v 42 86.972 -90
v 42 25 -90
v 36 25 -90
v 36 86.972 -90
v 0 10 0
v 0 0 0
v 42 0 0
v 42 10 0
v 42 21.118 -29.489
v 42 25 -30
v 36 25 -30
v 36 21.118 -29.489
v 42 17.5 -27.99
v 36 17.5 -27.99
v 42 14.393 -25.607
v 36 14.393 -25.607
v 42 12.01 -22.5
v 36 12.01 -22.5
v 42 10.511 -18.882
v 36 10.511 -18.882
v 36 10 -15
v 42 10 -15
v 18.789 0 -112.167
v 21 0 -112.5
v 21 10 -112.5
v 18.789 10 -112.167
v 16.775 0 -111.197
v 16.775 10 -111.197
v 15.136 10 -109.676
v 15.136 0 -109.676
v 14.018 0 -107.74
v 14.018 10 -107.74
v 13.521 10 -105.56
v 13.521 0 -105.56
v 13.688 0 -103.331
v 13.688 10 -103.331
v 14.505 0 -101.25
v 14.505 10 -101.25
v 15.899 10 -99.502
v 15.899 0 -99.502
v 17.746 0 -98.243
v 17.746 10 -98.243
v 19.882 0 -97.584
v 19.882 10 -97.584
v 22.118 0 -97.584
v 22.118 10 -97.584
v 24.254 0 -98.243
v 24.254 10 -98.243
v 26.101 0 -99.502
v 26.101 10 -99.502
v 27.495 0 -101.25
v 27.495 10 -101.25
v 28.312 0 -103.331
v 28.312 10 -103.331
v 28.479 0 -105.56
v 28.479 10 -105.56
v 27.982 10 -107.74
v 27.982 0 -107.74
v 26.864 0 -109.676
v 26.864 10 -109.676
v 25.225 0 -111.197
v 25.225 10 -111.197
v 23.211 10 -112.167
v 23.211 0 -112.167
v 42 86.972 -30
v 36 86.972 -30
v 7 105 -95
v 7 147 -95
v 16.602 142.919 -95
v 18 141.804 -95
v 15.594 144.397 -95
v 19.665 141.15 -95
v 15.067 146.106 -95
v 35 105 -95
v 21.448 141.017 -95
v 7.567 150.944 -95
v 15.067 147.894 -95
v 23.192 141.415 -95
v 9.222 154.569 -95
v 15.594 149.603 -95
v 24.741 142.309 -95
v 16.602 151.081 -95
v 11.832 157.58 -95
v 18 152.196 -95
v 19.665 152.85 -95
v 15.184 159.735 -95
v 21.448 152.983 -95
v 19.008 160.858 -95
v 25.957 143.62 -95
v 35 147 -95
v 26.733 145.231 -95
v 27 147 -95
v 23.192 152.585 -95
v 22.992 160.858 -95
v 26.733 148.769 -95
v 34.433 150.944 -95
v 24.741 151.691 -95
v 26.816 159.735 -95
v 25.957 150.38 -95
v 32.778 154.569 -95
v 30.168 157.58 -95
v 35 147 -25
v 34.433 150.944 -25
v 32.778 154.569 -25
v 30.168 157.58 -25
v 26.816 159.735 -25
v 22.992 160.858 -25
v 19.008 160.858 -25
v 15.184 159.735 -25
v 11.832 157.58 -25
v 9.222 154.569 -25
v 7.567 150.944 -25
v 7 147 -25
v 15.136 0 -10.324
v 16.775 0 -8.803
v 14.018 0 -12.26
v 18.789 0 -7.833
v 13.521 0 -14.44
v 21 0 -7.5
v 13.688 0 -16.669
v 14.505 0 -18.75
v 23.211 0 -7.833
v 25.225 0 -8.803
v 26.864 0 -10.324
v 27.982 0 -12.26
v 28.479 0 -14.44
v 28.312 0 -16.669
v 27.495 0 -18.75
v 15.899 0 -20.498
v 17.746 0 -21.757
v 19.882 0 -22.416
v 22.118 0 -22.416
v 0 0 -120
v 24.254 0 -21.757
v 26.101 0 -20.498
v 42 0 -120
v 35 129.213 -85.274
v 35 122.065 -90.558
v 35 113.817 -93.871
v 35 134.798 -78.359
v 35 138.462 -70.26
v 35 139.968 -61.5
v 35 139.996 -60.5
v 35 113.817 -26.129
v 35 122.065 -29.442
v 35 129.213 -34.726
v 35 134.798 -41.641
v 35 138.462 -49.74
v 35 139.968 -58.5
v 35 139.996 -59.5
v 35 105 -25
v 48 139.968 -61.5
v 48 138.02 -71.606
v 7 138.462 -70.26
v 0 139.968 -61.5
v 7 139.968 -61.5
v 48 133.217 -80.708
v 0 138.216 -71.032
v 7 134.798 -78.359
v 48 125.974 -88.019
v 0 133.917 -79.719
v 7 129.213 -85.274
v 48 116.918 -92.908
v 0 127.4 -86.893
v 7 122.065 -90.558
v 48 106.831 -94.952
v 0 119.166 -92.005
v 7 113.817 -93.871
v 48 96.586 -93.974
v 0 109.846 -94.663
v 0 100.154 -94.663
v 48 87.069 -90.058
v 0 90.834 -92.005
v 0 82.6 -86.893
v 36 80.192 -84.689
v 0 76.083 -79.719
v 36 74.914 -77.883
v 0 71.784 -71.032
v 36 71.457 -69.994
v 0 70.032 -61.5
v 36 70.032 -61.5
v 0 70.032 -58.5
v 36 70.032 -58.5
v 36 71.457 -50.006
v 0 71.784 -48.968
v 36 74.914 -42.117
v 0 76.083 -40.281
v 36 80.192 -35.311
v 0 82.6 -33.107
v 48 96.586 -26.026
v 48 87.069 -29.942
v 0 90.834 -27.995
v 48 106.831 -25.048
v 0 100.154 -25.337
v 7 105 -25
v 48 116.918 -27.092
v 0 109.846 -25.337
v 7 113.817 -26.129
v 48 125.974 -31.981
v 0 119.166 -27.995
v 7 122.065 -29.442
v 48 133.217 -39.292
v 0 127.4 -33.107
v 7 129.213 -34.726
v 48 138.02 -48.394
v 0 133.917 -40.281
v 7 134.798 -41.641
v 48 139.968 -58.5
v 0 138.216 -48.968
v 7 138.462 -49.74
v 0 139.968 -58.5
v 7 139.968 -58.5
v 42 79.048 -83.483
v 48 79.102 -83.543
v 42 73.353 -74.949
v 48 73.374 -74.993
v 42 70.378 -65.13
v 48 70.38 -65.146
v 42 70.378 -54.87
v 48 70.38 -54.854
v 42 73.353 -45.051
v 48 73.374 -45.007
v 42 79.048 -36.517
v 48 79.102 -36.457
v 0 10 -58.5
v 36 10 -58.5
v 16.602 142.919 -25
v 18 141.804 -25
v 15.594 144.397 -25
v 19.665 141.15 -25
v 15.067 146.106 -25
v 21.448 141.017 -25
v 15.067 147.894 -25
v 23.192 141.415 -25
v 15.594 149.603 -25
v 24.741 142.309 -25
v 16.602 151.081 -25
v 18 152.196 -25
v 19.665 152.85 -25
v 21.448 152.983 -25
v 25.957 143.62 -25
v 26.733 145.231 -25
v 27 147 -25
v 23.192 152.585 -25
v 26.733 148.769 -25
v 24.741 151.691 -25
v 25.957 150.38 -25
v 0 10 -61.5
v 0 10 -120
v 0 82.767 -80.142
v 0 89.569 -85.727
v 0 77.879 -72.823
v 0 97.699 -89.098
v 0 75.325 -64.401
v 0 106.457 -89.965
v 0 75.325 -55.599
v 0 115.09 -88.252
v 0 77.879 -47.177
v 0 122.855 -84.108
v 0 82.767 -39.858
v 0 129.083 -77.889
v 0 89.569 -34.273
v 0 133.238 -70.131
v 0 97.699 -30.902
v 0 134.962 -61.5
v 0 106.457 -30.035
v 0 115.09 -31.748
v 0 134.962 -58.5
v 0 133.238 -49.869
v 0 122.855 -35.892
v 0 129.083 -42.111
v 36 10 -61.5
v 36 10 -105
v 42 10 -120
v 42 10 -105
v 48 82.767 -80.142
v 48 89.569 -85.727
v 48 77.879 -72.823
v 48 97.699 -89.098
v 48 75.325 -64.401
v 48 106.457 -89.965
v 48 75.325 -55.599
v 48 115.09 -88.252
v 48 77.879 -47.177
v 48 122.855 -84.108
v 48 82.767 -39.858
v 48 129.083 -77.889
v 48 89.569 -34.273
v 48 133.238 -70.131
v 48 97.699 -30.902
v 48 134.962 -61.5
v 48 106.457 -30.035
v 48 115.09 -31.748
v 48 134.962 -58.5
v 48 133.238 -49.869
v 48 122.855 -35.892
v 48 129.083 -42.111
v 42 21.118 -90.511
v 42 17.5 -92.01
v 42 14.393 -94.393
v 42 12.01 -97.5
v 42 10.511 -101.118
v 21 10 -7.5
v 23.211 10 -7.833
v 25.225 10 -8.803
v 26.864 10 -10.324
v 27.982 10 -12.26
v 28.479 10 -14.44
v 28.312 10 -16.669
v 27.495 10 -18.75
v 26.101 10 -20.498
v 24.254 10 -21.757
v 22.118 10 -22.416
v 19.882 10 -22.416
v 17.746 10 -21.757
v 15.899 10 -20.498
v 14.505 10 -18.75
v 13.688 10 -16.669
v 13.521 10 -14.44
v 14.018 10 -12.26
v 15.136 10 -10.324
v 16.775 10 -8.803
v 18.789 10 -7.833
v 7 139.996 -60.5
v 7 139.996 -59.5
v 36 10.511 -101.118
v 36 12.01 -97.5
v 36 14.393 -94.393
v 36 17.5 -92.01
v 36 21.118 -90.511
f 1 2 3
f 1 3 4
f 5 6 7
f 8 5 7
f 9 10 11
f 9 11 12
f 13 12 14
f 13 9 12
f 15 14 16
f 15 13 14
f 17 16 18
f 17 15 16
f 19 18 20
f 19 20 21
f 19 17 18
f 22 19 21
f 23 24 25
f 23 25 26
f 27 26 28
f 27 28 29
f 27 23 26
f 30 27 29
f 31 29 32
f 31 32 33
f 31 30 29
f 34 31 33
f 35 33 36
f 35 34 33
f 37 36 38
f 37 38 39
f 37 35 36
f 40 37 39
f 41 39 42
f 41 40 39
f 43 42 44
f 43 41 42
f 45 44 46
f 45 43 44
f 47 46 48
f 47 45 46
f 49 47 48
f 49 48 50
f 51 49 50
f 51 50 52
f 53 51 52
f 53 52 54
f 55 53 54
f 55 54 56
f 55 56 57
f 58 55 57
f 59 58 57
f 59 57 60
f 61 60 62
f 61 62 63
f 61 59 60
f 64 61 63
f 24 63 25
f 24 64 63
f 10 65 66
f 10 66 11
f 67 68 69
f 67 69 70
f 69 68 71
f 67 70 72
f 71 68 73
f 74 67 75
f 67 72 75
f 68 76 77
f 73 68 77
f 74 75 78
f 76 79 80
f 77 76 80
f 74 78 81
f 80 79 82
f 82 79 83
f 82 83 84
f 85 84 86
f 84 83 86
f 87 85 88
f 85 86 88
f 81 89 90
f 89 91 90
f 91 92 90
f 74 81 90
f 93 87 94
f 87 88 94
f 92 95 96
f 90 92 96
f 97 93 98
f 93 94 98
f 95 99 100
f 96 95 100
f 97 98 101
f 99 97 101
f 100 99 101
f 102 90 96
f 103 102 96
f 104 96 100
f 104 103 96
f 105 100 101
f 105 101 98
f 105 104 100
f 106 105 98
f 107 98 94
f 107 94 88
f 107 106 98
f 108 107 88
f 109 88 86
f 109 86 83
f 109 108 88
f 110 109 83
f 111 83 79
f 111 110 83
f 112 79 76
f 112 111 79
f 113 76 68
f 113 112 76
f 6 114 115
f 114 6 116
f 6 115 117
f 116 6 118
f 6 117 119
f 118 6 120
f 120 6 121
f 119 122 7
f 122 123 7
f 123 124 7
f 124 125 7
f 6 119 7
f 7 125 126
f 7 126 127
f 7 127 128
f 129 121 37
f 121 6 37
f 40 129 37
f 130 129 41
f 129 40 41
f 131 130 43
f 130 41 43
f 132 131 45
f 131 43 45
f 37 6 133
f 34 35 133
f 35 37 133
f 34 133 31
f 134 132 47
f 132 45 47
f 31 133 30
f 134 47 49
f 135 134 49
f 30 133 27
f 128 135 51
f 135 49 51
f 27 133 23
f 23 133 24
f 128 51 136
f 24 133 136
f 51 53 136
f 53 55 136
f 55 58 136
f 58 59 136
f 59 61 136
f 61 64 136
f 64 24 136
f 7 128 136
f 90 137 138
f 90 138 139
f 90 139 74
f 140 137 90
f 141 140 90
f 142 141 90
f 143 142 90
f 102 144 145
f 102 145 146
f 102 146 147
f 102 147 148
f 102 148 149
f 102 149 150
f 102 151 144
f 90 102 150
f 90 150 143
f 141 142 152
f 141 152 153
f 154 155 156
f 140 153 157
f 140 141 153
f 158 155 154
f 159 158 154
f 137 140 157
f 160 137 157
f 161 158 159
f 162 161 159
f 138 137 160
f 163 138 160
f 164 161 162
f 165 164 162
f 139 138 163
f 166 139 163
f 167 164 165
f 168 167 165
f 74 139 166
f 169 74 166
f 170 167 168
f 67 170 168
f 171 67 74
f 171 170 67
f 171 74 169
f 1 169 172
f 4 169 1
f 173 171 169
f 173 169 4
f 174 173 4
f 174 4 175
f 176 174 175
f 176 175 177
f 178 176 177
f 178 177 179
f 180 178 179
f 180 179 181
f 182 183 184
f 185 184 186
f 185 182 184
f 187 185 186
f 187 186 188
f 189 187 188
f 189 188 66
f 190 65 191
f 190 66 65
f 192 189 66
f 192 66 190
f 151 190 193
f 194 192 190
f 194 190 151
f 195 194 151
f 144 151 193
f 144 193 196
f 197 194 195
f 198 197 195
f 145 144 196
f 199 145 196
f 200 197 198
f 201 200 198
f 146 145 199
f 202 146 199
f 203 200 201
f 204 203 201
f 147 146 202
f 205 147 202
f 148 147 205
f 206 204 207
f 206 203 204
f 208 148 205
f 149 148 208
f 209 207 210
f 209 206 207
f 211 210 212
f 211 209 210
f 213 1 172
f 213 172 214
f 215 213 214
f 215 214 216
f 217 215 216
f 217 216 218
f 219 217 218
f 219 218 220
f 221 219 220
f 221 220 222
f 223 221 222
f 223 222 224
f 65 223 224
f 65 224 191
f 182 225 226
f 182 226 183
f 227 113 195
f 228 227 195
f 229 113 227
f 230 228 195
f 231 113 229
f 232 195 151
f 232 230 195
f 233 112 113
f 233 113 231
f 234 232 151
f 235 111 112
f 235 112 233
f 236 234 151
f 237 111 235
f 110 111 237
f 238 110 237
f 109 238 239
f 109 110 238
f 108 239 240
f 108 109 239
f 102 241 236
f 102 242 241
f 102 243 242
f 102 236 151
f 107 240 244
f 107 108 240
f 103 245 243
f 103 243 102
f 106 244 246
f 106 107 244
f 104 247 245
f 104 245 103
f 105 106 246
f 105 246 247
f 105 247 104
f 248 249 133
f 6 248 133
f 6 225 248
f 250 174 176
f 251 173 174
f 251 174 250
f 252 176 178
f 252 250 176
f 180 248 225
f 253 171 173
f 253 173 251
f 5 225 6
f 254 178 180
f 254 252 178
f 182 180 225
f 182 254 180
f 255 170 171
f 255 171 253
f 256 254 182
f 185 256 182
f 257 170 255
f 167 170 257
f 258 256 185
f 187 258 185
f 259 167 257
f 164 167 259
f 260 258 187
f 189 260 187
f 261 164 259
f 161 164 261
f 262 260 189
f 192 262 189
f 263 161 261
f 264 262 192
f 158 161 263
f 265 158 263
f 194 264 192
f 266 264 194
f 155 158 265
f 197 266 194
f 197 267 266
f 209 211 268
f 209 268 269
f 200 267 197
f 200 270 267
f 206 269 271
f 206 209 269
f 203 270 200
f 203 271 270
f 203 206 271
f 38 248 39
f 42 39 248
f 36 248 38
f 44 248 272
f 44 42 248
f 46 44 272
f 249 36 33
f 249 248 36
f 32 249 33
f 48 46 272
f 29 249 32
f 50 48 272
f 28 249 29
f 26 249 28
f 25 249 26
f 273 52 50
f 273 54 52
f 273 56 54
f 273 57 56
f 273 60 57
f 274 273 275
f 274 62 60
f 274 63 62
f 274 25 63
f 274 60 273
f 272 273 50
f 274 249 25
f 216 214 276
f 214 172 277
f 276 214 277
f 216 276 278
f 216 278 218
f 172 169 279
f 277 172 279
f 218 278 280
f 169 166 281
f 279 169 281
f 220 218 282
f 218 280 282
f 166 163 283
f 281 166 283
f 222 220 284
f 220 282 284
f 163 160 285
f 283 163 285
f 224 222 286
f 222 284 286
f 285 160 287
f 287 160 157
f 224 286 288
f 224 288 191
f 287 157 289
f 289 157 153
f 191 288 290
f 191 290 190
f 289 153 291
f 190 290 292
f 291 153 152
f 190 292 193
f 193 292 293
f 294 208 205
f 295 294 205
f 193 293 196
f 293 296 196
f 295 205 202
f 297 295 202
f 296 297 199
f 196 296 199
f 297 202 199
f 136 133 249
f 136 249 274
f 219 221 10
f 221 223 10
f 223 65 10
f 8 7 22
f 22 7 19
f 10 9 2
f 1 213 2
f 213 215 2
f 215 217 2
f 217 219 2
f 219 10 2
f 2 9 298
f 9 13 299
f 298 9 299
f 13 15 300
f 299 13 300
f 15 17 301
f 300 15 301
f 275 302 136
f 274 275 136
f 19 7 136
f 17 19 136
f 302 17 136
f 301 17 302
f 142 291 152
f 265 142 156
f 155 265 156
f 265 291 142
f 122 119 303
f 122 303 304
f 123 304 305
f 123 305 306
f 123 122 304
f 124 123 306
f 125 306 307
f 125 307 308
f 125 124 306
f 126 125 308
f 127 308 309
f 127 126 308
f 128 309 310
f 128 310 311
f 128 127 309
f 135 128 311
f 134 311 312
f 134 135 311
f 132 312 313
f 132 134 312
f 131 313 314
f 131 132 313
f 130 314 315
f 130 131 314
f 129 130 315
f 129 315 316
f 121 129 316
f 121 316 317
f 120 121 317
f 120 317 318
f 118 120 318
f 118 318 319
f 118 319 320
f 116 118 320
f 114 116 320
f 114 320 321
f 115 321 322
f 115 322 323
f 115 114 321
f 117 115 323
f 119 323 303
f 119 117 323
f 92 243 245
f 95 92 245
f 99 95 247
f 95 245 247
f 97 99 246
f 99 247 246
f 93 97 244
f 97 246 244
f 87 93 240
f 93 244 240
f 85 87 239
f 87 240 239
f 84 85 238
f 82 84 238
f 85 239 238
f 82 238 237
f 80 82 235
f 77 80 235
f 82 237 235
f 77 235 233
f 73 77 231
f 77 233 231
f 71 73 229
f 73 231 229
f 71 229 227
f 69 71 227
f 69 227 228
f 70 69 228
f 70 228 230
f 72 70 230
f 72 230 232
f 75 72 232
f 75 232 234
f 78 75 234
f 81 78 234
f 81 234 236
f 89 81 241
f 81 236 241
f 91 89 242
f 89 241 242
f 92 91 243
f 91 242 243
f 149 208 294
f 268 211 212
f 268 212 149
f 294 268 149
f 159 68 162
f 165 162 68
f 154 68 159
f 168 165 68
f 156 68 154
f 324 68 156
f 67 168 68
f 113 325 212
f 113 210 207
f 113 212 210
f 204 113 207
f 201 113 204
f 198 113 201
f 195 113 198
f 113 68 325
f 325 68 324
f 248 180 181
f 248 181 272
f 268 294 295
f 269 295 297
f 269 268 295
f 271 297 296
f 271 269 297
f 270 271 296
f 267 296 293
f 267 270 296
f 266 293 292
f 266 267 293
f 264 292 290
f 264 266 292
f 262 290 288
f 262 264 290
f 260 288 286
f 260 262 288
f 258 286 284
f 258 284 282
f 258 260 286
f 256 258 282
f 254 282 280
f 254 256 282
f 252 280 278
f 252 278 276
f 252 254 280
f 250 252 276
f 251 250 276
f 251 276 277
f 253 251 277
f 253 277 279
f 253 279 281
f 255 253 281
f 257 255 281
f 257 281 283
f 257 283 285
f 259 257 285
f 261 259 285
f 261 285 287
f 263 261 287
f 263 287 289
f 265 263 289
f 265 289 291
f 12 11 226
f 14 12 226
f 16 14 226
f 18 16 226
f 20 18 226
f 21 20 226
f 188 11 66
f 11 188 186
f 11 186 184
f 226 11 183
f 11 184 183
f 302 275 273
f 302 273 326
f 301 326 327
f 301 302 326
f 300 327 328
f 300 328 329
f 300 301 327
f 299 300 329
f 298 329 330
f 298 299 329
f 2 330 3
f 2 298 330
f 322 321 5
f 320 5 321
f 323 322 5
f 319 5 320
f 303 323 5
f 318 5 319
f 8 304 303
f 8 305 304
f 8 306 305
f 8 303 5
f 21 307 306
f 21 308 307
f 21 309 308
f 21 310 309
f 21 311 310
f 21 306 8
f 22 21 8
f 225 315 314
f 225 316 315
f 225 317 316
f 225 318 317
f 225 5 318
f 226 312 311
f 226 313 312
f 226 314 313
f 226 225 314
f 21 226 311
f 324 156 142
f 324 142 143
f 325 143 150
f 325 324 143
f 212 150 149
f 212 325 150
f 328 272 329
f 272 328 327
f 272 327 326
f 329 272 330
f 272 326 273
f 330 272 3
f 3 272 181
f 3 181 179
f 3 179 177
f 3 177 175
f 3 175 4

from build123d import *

# Parameters (mm, degrees)
SKETCH1_W                = 42
SKETCH1_H                = 120
SKETCH1_R                = 7.5
BOSS_EXTRUDE1_DEPTH      = 10
BOSS_EXTRUDE2_DEPTH      = 6
BOSS_EXTRUDE3_DEPTH      = 6
BOSS_EXTRUDE3_DEPTH_BACK = 42
BOSS_EXTRUDE4_START      = 36
BOSS_EXTRUDE4_DEPTH      = 36
BOSS_EXTRUDE7_START      = -25
SKETCH5_R                = 6
BOSS_EXTRUDE7_DEPTH      = 70
CUT_EXTRUDE1_START       = -70
CUT_EXTRUDE1_DEPTH       = 70


with BuildPart() as part:
    # Sketch1 → Boss-Extrude1 (new body)
    with BuildSketch(Plane(origin=(0, 0, 0), x_dir=(1, 0, 0), z_dir=(0, 1, 0))):
        with Locations((21, 60)):
            Rectangle(SKETCH1_W, SKETCH1_H)
        with Locations(Location((21, 15, 0), (0, 0, 270))):
            Circle(SKETCH1_R, mode=Mode.SUBTRACT)
        with Locations(Location((21, 105, 0), (0, 0, 90))):
            Circle(SKETCH1_R, mode=Mode.SUBTRACT)
    extrude(amount=BOSS_EXTRUDE1_DEPTH)

    # Sketch2 → Boss-Extrude2 (add)
    with BuildSketch(Plane(origin=(42, 0, 0), x_dir=(0, 0, -1), z_dir=(1, 0, 0))):
        with BuildLine():
            Line((90, 25), (90, 86.972243623))
            ThreePointArc((90, 86.972243623), (60, 70), (30, 86.972243623))
            Line((30, 86.972243623), (30, 25))
            ThreePointArc((30, 25), (25.606601718, 14.393398282), (15, 10))
            Line((15, 10), (105, 10))
            ThreePointArc((105, 10), (94.393398282, 14.393398282), (90, 25))
        make_face()
    extrude(amount=-BOSS_EXTRUDE2_DEPTH)

    # Sketch3 → Boss-Extrude3 (add, two sides: drawn at the far end of the back side and taken through both)
    with BuildSketch(Plane(origin=(42, 0, 0), x_dir=(0, 0, -1), z_dir=(1, 0, 0)).offset(-BOSS_EXTRUDE3_DEPTH_BACK)):
        with BuildLine():
            Line((61.5, 134.962476533), (61.5, 139.96784237))
            ThreePointArc((61.5, 139.96784237), (60, 70), (58.5, 139.96784237))
            Line((58.5, 139.96784237), (58.5, 134.962476533))
            ThreePointArc((58.5, 134.962476533), (60, 75), (61.5, 134.962476533))
        make_face()
    extrude(amount=BOSS_EXTRUDE3_DEPTH + BOSS_EXTRUDE3_DEPTH_BACK)

    # Sketch4 → Boss-Extrude4 (add)
    with BuildSketch(Plane.ZY.offset(-36).offset(BOSS_EXTRUDE4_START)):
        with BuildLine():
            Line((-61.5, 10), (-58.5, 10))
            Line((-58.5, 10), (-58.5, 70.03215763))
            ThreePointArc((-58.5, 70.03215763), (-60, 70), (-61.5, 70.03215763))
            Line((-61.5, 70.03215763), (-61.5, 10))
        make_face()
    extrude(amount=-BOSS_EXTRUDE4_DEPTH)

    # Sketch5 → Boss-Extrude7 (add)
    with BuildSketch(Plane.XY.offset(BOSS_EXTRUDE7_START)):
        with BuildLine():
            Line((7, 105), (35, 105))
            Line((35, 105), (35, 147))
            ThreePointArc((35, 147), (21, 161), (7, 147))
            Line((7, 147), (7, 105))
        make_face()
        with Locations((21, 147)):
            Circle(SKETCH5_R, mode=Mode.SUBTRACT)
    extrude(amount=-BOSS_EXTRUDE7_DEPTH)

    # Sketch6 → Cut-Extrude1 (cut)
    with BuildSketch(Plane(origin=(48, 0, 0), x_dir=(0, 0, -1), z_dir=(1, 0, 0)).offset(CUT_EXTRUDE1_START)):
        with BuildLine():
            Line((58.5, 139.96784237), (58.5, 134.962476533))
            ThreePointArc((58.5, 134.962476533), (60, 75), (61.5, 134.962476533))
            Line((61.5, 134.962476533), (61.5, 139.96784237))
            ThreePointArc((61.5, 139.96784237), (60, 140), (58.5, 139.96784237))
        make_face()
    extrude(amount=CUT_EXTRUDE1_DEPTH, mode=Mode.SUBTRACT)


solid = part.part
